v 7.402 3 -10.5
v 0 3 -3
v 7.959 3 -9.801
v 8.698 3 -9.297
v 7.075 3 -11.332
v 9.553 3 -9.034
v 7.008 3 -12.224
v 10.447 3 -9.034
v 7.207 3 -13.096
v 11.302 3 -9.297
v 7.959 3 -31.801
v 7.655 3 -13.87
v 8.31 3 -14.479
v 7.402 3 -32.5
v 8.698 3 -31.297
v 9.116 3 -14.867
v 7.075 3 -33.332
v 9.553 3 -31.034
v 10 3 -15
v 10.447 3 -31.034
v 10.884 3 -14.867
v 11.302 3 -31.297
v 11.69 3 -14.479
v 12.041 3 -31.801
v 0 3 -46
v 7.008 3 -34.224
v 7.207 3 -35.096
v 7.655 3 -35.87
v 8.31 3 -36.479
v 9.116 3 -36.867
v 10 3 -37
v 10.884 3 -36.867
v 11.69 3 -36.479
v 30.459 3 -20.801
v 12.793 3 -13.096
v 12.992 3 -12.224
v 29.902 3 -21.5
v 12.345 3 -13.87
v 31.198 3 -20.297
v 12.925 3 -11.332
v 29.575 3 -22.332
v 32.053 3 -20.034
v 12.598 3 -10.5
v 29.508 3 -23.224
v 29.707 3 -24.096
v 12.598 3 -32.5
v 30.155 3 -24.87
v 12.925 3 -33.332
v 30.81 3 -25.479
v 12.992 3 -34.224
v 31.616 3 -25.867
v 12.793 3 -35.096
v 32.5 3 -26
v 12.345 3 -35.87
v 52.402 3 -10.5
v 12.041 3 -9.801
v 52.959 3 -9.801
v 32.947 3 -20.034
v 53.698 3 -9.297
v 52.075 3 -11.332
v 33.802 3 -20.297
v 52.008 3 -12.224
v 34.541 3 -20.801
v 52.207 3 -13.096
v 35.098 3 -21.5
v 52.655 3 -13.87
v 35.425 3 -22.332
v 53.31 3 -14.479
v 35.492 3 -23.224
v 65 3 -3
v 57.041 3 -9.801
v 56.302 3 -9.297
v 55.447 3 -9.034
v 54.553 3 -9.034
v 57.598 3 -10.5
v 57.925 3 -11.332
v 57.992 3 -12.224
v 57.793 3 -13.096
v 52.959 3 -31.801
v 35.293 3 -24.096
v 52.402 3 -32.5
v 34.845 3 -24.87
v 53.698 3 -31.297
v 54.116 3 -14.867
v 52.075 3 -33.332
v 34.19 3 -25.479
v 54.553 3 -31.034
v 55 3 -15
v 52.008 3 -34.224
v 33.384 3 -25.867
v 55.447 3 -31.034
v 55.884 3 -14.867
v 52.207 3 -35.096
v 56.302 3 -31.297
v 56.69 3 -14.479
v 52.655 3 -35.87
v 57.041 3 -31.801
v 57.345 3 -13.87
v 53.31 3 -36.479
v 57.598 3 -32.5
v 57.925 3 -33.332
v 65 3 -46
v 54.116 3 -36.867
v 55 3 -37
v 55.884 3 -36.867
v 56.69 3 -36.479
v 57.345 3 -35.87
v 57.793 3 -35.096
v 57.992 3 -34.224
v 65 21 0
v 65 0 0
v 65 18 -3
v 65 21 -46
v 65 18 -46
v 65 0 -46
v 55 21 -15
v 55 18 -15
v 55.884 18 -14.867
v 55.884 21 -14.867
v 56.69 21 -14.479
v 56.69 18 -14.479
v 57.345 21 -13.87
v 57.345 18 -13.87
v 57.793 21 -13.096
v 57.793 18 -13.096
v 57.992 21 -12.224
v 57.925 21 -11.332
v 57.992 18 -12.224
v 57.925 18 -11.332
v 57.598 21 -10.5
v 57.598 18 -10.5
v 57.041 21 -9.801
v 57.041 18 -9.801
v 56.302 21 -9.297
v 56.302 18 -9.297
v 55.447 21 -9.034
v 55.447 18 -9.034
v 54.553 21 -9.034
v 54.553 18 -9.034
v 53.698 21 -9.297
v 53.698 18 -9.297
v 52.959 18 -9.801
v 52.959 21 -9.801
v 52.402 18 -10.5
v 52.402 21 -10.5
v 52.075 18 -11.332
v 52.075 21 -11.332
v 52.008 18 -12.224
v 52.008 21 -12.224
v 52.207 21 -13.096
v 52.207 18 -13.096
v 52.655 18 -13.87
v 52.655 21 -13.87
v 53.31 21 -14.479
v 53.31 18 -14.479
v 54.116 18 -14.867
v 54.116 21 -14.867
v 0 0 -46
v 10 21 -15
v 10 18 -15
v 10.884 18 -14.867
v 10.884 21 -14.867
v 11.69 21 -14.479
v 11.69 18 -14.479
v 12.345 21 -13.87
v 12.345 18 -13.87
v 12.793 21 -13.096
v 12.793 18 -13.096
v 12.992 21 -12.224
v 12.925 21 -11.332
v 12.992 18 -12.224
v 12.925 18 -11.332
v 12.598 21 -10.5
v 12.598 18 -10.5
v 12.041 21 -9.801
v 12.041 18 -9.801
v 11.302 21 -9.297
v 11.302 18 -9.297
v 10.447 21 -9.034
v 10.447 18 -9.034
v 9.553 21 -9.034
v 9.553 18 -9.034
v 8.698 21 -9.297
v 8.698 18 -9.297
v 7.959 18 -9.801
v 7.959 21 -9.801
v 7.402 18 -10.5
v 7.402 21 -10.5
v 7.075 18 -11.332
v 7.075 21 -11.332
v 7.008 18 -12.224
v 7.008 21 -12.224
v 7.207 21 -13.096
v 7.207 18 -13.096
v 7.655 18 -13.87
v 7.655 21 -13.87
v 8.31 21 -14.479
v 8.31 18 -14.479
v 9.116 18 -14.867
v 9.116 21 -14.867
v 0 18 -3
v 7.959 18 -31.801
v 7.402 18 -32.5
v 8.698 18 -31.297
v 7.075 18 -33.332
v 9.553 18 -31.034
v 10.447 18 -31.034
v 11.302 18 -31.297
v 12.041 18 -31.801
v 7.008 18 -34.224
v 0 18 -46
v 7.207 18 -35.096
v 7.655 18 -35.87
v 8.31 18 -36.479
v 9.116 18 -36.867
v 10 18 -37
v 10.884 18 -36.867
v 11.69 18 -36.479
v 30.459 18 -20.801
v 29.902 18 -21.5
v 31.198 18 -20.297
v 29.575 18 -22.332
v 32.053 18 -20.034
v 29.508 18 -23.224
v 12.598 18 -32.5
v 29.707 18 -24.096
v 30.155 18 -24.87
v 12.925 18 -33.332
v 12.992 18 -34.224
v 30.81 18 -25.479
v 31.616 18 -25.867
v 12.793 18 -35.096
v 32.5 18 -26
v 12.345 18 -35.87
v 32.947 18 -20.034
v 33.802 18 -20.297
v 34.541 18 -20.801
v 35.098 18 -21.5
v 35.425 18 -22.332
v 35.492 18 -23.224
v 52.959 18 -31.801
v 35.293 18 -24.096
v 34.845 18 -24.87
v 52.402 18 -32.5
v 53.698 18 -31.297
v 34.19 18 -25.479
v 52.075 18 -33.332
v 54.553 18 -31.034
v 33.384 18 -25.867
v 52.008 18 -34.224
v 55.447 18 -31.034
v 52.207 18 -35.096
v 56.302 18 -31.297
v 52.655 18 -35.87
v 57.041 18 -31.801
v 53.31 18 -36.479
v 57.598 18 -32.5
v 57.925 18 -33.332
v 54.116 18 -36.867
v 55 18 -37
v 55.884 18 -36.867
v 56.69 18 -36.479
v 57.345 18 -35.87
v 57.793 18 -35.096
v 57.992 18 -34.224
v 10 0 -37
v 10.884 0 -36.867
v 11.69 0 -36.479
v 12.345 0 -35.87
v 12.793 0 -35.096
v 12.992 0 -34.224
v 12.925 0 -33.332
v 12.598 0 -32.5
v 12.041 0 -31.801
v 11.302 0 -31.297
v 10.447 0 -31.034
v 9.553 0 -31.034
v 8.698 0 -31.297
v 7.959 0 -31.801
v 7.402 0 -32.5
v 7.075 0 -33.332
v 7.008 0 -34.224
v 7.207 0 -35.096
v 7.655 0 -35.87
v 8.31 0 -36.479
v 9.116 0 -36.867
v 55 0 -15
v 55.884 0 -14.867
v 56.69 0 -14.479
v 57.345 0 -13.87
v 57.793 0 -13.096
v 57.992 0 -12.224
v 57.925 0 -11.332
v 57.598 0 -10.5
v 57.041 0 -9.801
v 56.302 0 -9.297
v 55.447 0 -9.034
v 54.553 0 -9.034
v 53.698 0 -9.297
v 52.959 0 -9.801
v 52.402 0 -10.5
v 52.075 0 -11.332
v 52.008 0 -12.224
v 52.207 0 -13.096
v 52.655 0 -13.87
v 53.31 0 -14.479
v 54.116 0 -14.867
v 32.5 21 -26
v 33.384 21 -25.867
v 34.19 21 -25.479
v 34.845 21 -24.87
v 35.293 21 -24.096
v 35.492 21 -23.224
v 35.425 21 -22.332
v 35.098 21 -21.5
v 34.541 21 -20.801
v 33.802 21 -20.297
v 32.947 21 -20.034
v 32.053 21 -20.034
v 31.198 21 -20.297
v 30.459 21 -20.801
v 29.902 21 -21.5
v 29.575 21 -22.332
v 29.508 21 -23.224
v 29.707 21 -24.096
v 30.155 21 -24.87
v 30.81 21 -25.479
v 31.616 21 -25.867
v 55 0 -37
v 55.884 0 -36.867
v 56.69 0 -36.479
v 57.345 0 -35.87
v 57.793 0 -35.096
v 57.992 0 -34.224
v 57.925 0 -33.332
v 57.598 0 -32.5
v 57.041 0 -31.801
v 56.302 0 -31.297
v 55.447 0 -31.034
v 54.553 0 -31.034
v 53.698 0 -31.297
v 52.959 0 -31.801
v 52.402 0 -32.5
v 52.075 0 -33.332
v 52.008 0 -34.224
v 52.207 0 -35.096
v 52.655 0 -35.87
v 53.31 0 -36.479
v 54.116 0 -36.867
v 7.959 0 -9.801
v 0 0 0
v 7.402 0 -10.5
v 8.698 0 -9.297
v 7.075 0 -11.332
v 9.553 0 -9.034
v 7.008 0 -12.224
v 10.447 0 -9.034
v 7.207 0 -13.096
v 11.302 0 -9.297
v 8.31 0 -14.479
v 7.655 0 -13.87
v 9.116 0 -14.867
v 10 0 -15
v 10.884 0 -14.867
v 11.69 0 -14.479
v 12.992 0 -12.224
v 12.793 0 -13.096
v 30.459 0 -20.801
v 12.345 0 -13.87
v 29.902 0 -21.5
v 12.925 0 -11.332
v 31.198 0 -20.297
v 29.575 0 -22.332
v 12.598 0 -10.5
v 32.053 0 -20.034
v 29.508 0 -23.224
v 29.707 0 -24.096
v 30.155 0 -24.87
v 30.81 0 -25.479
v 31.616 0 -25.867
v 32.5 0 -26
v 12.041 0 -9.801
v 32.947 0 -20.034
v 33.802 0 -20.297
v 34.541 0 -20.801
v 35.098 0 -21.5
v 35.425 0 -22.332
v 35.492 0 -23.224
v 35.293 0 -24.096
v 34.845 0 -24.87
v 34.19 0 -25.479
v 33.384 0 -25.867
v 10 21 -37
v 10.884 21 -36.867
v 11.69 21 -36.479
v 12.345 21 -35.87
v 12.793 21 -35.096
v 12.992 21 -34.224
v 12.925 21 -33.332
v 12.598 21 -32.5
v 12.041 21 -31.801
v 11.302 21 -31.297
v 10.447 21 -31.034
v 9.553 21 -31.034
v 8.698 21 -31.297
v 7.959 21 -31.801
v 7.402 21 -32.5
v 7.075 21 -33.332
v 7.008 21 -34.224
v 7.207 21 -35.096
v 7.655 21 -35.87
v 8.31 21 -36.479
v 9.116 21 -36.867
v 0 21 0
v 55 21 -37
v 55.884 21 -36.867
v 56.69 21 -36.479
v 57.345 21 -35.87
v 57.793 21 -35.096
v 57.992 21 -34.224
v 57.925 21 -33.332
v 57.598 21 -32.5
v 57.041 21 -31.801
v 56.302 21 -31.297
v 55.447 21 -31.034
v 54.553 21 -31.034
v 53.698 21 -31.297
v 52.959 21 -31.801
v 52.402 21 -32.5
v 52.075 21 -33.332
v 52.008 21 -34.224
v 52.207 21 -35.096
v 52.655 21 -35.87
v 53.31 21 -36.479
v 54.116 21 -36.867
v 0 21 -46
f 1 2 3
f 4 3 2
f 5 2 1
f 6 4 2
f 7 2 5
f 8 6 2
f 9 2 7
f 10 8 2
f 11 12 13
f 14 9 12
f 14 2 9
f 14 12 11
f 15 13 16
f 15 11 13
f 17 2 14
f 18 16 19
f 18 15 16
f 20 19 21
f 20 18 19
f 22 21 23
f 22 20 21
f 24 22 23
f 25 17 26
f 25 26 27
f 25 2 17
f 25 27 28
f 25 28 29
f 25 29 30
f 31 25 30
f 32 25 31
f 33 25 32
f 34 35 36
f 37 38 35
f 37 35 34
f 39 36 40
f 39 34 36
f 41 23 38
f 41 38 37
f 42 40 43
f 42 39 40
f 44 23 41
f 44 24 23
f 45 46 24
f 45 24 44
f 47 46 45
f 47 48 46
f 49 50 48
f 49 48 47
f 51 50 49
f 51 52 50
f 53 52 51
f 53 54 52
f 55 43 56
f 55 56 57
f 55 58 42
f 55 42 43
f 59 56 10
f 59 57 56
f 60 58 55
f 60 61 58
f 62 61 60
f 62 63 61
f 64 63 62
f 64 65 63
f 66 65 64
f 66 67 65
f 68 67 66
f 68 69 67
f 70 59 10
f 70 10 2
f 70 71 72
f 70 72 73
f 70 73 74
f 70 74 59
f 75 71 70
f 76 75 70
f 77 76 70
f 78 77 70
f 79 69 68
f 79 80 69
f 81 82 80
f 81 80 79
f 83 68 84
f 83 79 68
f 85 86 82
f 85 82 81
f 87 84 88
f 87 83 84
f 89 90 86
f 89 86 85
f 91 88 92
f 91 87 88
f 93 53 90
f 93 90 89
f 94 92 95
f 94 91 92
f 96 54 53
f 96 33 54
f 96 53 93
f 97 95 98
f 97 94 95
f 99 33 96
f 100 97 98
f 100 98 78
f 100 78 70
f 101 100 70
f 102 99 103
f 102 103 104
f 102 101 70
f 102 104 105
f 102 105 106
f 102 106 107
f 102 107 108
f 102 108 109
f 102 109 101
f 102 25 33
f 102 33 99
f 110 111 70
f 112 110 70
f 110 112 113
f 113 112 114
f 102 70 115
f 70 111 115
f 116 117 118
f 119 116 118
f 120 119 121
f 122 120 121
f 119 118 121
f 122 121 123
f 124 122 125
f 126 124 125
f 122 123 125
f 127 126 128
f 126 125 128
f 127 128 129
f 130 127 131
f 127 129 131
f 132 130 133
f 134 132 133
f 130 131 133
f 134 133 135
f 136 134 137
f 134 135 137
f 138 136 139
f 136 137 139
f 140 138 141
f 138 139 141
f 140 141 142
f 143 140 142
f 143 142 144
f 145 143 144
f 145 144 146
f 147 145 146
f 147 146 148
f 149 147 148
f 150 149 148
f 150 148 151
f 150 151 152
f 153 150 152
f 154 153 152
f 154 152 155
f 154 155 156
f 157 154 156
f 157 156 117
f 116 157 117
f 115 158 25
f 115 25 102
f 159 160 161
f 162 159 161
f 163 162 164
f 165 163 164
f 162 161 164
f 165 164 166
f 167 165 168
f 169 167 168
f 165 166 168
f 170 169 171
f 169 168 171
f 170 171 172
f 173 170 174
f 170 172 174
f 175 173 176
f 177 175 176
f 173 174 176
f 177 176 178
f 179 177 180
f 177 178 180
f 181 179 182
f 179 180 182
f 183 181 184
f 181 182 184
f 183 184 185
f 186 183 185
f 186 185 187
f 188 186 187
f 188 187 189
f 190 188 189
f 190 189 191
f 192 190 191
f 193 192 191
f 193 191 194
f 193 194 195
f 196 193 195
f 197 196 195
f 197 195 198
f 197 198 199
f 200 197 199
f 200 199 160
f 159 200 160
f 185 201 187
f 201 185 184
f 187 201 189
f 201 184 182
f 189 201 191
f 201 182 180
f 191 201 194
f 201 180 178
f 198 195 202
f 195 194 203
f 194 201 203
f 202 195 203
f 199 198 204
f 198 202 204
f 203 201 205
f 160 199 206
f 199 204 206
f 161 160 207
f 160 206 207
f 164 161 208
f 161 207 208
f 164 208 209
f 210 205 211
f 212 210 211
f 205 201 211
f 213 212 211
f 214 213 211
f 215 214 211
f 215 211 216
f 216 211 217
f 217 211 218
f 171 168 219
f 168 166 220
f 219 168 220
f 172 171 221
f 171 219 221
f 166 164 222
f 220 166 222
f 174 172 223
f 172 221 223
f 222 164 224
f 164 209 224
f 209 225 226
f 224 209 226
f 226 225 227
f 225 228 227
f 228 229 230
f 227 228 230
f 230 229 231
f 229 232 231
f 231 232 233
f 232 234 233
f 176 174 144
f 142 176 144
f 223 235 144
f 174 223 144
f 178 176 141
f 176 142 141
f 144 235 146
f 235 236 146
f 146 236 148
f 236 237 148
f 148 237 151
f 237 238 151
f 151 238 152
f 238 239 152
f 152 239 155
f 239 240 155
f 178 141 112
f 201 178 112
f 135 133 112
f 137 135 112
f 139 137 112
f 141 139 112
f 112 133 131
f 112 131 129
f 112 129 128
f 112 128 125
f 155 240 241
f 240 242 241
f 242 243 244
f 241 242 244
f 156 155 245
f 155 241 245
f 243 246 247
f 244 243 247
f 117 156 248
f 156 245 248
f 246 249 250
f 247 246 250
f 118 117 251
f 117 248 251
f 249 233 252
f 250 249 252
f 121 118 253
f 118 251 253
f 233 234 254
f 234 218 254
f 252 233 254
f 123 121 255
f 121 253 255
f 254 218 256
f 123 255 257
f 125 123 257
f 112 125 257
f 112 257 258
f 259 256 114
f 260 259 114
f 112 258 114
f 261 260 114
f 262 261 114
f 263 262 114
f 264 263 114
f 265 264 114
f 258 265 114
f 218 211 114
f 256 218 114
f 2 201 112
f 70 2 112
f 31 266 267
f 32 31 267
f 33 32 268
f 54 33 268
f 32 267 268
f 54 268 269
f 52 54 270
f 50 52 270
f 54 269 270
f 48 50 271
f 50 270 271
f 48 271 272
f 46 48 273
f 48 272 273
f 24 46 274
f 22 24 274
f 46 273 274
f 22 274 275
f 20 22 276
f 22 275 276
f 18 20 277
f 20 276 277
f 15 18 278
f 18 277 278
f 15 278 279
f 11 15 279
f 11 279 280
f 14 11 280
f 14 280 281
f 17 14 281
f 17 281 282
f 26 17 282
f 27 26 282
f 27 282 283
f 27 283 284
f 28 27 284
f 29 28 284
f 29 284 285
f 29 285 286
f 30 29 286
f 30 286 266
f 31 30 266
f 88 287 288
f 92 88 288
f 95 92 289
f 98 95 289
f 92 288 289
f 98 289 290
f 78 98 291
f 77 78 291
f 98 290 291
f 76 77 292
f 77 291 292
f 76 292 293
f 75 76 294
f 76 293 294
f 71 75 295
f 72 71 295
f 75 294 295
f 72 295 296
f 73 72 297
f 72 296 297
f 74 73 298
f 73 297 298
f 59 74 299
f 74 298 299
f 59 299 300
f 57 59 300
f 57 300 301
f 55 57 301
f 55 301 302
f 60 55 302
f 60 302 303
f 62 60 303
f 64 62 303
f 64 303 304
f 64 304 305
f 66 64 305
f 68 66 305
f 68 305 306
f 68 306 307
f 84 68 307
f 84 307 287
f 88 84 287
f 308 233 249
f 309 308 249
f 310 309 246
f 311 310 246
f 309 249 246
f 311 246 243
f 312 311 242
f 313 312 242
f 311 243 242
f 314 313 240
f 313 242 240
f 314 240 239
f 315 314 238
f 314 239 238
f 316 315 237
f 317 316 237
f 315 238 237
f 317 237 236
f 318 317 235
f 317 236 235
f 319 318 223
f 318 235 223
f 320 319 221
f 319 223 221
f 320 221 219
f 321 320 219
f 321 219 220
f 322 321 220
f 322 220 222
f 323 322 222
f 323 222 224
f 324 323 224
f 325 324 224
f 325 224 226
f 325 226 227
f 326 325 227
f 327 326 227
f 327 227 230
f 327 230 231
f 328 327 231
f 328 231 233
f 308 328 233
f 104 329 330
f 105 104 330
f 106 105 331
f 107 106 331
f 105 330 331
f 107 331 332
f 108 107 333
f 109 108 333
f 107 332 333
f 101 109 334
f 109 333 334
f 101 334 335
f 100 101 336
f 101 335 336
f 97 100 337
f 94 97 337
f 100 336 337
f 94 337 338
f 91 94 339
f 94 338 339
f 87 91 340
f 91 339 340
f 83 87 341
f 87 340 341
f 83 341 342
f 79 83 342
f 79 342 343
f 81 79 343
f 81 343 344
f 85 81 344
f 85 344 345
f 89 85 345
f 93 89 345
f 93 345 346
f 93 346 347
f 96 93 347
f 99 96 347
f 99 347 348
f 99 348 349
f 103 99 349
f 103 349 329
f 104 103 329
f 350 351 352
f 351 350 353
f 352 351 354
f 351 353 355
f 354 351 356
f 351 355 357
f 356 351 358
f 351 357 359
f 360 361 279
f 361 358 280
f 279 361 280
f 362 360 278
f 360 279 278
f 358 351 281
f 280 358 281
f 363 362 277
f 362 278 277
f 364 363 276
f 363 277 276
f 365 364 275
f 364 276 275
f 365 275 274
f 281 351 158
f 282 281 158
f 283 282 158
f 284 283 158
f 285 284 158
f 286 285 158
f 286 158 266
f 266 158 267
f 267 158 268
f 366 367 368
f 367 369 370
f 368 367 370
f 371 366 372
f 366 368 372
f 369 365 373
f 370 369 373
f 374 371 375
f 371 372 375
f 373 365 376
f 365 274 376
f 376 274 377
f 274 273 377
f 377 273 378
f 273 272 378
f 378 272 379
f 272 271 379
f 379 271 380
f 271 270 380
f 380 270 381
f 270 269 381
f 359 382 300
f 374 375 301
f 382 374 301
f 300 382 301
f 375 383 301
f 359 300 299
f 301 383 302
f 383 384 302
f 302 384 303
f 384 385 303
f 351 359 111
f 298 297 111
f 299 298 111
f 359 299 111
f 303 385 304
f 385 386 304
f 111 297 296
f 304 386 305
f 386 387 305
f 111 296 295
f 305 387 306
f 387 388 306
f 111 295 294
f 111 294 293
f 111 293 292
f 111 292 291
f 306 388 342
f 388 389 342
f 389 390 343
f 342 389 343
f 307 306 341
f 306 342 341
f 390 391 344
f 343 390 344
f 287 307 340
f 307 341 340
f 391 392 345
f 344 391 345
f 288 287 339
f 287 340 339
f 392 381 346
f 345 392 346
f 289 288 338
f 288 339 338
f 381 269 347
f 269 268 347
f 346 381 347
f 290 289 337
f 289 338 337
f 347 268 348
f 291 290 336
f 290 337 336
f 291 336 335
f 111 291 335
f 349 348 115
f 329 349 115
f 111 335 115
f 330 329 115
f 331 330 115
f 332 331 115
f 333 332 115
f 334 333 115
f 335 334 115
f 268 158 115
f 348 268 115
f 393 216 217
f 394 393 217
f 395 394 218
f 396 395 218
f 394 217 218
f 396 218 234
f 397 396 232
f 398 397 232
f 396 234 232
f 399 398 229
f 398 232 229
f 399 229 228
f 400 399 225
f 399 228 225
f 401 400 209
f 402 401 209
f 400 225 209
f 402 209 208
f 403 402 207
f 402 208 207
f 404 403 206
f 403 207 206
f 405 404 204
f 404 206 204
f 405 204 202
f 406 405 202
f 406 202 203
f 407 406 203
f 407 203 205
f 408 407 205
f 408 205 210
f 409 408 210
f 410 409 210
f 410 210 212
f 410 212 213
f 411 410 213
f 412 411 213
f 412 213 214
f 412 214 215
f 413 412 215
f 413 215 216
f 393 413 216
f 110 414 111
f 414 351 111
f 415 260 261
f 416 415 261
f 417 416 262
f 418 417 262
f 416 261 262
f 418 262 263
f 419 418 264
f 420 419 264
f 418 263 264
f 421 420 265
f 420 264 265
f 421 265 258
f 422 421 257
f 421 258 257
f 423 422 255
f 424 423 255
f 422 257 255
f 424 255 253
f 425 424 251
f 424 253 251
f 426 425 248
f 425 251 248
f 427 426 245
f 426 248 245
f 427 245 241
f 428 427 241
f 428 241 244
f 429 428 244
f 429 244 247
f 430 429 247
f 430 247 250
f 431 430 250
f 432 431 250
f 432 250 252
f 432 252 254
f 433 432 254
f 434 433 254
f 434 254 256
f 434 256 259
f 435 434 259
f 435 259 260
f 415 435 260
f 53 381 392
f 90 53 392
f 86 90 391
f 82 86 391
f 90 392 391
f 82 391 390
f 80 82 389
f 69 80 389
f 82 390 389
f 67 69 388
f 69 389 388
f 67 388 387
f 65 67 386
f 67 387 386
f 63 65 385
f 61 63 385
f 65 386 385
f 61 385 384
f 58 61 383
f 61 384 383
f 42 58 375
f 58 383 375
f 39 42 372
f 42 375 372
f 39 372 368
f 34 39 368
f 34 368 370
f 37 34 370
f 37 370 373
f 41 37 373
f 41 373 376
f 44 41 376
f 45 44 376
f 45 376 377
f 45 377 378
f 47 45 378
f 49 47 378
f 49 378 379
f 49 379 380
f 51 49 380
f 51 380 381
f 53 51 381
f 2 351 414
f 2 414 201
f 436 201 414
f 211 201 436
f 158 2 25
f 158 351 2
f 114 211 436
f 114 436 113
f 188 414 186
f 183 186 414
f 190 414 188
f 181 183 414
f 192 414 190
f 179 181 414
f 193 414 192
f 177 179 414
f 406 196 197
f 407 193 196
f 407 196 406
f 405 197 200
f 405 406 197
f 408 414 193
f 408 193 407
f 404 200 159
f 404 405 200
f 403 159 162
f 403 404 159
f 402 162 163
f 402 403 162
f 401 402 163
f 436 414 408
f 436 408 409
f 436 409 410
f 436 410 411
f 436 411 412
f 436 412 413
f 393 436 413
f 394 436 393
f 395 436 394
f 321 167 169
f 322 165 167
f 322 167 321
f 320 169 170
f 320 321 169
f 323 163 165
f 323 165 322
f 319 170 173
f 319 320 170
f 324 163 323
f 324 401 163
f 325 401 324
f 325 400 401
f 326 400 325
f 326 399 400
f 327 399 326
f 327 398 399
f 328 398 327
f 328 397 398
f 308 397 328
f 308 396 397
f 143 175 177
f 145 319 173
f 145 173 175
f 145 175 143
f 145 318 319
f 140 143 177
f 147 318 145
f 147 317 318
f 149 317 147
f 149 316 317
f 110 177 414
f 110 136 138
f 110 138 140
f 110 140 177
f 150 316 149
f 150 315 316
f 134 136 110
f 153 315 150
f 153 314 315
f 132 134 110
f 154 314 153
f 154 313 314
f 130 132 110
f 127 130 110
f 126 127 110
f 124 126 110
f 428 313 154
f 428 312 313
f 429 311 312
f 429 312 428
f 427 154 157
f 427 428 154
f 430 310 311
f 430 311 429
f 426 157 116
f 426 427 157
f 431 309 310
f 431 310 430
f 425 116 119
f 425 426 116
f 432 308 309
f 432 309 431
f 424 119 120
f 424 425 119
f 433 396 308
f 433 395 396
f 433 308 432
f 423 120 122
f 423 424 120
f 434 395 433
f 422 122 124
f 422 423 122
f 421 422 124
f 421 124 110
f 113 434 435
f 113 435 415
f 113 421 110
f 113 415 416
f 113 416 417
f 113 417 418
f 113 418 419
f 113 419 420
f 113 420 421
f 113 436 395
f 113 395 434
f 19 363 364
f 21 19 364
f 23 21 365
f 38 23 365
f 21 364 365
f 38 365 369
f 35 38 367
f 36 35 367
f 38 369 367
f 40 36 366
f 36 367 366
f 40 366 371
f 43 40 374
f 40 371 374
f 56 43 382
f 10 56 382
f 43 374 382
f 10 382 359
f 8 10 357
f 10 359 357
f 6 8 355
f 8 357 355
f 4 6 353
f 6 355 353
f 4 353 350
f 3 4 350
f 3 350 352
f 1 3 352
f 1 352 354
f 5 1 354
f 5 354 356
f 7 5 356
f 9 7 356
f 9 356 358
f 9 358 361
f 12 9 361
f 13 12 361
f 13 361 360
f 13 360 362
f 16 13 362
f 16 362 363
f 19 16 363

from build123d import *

# Parameters (mm, degrees)
SKETCH_1_W          = 65
SKETCH_1_H          = 46
EXTRUDE_1_DEPTH     = 3
SKETCH_2_W          = 65
SKETCH_2_H          = 15
EXTRUDE_2_DEPTH     = 3
SKETCH_3_W          = 65
SKETCH_3_H          = 46
EXTRUDE_3_DEPTH     = 3
SKETCH_4_R          = 3
CUT_EXTRUDE_1_DEPTH = 83.35289916


with BuildPart() as part:
    # 草图1 → 凸台-拉伸1 (new body)
    with BuildSketch(Plane(origin=(0, 0, 0), x_dir=(1, 0, 0), z_dir=(0, 1, 0))):
        with Locations((32.5, 23)):
            Rectangle(SKETCH_1_W, SKETCH_1_H)
    extrude(amount=EXTRUDE_1_DEPTH)

    # 草图2 → 凸台-拉伸2 (add)
    with BuildSketch(Plane.XY):
        with Locations((32.5, 10.5)):
            Rectangle(SKETCH_2_W, SKETCH_2_H)
    extrude(amount=-EXTRUDE_2_DEPTH)

    # 草图3 → 凸台-拉伸3 (add)
    with BuildSketch(Plane(origin=(0, 18, 0), x_dir=(1, 0, 0), z_dir=(0, 1, 0))):
        with Locations((32.5, 23)):
            Rectangle(SKETCH_3_W, SKETCH_3_H)
    extrude(amount=EXTRUDE_3_DEPTH)

    # 草图4 → 切除-拉伸1 (cut, through all)
    with BuildSketch(Plane.XZ):
        with Locations(Location((32.5, -23, 0), (0, 0, 270))):
            Circle(SKETCH_4_R)
        with Locations(Location((55, -34, 0), (0, 0, 270))):
            Circle(SKETCH_4_R)
        with Locations(Location((55, -12, 0), (0, 0, 270))):
            Circle(SKETCH_4_R)
        with Locations(Location((10, -34, 0), (0, 0, 270))):
            Circle(SKETCH_4_R)
        with Locations(Location((10, -12, 0), (0, 0, 270))):
            Circle(SKETCH_4_R)
    extrude(amount=-CUT_EXTRUDE_1_DEPTH, mode=Mode.SUBTRACT)


solid = part.part
